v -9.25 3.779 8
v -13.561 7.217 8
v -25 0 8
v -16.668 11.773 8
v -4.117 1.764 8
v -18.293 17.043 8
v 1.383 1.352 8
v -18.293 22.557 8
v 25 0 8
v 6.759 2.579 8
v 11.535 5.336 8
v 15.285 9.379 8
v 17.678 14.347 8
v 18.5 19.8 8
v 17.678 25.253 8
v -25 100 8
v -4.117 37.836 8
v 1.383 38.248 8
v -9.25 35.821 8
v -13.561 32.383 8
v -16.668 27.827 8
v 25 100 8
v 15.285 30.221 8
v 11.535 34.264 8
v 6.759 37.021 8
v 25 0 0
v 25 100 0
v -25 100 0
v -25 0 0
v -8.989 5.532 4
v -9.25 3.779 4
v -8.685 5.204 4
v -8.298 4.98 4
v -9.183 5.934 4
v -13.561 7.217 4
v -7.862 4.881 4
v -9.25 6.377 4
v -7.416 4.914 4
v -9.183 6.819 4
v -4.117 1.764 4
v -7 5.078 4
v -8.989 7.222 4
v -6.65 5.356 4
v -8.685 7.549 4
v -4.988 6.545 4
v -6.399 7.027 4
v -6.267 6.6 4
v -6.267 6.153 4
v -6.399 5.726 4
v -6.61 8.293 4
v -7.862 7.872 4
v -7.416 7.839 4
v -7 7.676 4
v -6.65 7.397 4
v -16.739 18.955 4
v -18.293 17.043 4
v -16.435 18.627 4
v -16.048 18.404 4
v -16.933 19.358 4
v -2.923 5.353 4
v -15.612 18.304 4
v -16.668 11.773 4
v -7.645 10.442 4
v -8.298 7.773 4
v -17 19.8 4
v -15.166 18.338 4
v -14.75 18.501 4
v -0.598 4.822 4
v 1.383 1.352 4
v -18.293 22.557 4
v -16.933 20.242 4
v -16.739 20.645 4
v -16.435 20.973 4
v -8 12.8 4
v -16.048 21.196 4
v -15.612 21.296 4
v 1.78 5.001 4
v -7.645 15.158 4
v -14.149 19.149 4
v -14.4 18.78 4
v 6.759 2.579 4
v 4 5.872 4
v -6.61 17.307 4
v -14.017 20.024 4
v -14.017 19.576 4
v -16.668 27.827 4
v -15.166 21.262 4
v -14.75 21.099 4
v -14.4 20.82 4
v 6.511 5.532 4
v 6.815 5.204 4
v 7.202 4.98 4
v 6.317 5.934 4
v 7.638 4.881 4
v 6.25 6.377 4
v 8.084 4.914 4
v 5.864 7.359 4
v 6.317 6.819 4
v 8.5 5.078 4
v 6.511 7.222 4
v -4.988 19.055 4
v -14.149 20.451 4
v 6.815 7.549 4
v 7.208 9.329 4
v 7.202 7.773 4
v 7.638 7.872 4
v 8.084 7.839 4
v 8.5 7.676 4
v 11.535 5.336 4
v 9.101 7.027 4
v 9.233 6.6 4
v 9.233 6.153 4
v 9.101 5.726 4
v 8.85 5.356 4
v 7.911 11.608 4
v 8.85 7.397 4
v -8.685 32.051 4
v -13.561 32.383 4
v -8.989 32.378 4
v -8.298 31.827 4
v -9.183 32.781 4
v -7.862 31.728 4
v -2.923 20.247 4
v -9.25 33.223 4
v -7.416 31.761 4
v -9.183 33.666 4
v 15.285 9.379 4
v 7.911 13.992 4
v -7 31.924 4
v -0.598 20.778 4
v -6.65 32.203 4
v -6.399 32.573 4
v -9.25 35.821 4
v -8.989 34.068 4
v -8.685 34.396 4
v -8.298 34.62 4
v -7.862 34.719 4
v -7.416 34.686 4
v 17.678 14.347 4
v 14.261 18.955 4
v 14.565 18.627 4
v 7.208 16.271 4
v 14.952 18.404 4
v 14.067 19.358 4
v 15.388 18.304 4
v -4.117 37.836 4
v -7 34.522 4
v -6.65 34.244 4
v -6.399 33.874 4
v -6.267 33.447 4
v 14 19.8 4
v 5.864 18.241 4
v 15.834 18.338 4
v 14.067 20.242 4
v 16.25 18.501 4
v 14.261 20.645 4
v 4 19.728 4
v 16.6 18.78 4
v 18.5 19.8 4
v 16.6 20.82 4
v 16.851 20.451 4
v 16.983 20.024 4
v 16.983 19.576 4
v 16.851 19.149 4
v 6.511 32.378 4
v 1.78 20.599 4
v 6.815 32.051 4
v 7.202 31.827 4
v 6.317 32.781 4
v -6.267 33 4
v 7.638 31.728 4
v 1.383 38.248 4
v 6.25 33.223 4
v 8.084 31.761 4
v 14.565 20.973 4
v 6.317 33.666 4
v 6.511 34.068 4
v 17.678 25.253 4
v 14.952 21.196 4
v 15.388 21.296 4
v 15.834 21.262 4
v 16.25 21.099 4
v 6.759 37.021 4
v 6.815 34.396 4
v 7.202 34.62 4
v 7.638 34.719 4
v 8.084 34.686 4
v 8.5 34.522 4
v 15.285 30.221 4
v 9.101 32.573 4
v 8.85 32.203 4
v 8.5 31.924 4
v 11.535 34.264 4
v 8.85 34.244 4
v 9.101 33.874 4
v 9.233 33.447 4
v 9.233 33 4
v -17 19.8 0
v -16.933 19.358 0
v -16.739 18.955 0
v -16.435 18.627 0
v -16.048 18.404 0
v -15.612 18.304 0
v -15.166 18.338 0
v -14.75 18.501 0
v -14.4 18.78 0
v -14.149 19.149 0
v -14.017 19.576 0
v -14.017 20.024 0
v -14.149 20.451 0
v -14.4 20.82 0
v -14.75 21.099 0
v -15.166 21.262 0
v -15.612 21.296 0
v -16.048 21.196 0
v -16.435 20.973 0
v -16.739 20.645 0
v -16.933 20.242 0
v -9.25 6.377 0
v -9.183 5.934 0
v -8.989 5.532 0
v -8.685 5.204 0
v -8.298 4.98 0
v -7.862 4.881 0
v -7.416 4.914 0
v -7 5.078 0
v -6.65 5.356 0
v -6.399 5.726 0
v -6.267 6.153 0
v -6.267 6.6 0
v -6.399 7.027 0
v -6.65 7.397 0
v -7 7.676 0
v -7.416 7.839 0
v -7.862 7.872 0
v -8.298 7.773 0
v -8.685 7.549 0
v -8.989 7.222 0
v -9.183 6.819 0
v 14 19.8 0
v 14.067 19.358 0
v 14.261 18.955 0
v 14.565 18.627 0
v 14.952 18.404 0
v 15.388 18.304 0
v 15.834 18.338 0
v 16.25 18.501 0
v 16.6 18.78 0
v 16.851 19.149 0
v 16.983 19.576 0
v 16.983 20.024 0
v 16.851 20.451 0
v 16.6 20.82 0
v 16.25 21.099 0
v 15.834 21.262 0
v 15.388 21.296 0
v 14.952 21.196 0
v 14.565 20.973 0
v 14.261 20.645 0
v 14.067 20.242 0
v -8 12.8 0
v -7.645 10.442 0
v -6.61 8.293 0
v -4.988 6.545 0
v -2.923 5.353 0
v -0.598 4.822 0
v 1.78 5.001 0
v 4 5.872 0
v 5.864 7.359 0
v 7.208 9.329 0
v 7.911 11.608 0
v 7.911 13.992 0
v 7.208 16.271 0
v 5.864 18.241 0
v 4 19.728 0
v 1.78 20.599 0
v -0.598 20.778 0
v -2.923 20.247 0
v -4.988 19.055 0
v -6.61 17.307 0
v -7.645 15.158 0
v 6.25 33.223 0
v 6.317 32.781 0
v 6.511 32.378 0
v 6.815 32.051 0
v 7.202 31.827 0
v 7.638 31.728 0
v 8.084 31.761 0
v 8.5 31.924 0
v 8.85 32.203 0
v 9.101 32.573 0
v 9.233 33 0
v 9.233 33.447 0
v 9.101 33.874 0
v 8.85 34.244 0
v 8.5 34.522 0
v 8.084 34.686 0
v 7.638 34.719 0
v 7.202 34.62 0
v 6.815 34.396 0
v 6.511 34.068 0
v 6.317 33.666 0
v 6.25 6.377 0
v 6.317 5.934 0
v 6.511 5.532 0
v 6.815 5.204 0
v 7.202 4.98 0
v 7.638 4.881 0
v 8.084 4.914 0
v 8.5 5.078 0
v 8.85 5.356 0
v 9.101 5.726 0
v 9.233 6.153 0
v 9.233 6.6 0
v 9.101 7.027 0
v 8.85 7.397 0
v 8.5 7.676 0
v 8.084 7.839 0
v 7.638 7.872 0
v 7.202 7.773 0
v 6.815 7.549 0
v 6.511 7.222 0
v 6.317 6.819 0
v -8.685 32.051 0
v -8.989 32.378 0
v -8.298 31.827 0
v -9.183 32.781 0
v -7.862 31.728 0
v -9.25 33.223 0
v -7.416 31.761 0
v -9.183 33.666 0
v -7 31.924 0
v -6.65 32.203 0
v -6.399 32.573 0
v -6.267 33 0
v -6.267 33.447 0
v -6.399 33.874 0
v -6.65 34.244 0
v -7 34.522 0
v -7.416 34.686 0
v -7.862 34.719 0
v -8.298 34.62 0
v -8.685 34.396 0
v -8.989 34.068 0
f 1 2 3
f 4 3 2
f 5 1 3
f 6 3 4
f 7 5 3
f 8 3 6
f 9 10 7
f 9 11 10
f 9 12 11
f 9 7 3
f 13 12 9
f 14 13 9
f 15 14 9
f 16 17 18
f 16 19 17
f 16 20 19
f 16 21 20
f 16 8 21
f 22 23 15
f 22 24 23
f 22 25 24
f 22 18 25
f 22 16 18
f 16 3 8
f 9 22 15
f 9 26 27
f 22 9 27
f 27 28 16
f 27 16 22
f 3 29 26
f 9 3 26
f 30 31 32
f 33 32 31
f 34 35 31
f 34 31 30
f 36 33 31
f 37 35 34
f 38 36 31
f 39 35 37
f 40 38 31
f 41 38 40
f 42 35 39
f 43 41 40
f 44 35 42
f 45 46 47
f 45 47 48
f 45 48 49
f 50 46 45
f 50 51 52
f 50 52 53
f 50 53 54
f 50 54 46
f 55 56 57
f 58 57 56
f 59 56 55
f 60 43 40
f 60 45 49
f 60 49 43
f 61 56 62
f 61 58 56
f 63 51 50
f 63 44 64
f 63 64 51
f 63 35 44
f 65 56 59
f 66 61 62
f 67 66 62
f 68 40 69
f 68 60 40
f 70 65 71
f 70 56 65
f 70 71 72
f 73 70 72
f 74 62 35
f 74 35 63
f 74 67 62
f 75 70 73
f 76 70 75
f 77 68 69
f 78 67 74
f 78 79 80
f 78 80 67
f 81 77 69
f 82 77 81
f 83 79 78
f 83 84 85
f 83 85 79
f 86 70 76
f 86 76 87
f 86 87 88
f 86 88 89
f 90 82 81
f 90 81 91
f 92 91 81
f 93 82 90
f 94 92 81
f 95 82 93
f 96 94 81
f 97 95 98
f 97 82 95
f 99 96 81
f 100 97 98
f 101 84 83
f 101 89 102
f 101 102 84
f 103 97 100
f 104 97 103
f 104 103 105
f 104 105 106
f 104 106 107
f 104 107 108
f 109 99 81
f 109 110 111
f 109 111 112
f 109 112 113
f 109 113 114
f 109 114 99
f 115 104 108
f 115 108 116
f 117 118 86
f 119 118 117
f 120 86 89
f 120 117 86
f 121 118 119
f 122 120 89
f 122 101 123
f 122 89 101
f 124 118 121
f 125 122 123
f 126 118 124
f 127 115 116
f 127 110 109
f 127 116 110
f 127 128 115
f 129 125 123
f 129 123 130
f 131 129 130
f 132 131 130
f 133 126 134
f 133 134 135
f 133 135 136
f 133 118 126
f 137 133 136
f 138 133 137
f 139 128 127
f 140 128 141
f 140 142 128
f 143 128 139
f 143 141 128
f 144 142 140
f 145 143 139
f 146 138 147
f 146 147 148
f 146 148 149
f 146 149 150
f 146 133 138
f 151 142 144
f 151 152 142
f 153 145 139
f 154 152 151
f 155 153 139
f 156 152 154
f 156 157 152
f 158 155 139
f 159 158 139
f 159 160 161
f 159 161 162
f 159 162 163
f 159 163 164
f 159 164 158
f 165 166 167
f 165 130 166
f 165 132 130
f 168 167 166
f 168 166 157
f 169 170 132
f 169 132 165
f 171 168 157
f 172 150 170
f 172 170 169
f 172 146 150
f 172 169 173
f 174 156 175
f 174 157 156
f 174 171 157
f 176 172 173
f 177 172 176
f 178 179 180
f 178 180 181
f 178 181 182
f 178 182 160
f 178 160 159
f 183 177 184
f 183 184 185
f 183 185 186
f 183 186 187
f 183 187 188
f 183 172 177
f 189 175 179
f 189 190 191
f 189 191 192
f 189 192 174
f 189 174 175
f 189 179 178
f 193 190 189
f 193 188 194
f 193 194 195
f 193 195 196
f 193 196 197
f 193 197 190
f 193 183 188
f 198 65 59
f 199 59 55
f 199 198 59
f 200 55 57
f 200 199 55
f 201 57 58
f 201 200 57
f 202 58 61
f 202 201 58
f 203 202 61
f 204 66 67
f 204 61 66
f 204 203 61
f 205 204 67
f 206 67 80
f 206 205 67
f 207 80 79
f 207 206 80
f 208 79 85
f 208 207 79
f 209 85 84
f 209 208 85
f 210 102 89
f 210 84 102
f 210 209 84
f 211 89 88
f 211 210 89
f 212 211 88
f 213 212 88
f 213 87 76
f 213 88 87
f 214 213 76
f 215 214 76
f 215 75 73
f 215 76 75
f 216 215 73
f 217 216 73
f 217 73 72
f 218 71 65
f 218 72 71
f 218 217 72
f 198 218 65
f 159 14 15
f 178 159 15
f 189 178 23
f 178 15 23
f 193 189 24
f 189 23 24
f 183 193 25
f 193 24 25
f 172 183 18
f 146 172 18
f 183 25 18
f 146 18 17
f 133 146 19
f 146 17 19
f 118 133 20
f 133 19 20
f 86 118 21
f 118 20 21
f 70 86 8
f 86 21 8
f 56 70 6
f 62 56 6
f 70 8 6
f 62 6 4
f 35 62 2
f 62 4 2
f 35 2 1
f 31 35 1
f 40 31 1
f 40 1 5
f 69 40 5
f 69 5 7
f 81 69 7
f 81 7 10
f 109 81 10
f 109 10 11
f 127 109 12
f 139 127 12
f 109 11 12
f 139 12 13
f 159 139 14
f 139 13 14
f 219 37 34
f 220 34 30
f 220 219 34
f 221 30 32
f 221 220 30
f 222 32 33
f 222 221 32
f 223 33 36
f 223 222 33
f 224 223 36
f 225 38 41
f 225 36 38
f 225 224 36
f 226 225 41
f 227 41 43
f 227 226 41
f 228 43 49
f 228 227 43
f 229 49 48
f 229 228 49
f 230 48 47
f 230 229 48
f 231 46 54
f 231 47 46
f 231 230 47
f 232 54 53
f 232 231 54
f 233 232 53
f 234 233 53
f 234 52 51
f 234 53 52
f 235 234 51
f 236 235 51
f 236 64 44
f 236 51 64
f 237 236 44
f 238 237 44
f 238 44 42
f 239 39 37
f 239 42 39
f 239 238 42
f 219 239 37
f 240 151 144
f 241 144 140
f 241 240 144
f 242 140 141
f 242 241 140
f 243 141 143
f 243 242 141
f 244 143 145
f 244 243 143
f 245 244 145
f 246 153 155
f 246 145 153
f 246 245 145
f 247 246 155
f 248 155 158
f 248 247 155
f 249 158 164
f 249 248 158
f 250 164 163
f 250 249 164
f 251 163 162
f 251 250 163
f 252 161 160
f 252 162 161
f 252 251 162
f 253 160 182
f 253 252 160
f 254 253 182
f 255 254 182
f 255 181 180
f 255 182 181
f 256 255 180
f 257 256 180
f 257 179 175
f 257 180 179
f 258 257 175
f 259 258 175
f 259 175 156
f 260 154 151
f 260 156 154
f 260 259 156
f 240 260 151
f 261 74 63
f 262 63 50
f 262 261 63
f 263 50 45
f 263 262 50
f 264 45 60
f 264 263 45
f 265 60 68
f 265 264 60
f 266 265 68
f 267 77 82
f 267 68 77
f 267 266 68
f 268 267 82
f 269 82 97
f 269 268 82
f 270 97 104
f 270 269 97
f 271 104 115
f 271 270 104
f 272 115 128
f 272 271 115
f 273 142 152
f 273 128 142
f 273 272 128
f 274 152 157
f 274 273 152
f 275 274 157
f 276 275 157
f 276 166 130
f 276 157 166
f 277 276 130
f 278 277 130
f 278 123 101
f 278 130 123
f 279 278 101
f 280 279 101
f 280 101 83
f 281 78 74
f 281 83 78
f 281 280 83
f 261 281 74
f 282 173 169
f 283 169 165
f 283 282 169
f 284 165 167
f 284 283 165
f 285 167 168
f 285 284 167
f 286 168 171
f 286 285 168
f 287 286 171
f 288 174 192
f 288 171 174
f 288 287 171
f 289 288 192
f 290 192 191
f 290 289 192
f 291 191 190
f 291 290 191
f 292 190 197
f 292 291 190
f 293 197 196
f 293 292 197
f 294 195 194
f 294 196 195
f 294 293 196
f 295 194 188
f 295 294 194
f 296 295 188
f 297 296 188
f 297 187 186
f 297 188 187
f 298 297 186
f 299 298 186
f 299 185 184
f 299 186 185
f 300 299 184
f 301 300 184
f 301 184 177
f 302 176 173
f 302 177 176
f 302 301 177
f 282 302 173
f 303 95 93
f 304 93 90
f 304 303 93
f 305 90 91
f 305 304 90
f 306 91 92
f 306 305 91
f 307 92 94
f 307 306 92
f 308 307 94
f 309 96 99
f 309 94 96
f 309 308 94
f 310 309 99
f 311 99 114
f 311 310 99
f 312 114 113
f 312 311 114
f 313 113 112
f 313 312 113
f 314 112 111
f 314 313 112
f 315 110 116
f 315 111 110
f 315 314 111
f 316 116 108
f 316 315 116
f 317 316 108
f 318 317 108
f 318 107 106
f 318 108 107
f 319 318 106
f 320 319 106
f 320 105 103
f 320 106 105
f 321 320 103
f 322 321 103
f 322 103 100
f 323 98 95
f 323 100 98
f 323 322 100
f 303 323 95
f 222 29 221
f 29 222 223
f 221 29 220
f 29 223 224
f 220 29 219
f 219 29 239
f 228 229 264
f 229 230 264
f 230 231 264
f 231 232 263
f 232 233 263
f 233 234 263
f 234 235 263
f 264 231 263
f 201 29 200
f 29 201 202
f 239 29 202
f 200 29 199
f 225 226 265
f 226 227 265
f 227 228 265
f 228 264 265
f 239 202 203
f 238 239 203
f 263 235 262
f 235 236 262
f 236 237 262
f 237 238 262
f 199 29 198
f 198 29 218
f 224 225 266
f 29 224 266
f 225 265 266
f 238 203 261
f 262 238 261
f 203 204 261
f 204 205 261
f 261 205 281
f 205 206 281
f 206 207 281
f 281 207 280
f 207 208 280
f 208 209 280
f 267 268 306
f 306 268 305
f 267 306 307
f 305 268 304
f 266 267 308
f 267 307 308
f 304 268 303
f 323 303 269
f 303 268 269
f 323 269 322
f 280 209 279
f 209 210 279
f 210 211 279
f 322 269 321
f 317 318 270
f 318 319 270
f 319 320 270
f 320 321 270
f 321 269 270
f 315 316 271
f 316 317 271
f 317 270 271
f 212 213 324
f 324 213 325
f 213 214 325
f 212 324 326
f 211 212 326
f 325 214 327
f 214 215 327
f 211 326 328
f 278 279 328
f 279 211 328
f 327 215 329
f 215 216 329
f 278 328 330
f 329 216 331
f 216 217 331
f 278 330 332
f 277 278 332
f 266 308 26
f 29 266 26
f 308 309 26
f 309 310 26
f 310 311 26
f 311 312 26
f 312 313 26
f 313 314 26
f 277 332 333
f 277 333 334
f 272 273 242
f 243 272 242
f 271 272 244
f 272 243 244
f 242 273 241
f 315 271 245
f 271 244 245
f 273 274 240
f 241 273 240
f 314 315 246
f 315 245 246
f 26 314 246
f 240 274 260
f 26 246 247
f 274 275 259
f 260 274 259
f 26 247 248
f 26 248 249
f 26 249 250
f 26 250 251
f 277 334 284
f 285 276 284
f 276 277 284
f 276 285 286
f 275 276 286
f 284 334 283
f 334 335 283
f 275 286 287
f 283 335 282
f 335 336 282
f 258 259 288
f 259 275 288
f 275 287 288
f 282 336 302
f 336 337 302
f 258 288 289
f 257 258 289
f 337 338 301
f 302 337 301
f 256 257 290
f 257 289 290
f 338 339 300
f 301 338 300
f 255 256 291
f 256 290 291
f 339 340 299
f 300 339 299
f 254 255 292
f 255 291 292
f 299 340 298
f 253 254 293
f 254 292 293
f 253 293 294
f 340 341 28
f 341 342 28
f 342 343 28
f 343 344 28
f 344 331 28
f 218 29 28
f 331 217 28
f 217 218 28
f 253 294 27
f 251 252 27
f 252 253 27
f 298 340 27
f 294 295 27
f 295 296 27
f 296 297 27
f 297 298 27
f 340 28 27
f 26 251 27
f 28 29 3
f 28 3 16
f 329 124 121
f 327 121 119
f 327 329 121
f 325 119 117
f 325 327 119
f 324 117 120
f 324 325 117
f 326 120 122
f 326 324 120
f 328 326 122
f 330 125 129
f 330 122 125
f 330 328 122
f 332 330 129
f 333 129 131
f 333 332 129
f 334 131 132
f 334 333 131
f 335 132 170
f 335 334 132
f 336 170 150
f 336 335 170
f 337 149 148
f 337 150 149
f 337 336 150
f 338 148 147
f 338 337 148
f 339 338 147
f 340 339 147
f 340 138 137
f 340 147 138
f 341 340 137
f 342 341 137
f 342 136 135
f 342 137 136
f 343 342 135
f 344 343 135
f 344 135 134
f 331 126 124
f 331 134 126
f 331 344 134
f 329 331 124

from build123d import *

# Parameters (mm, degrees)
SKETCH3_W           = 50
SKETCH3_H           = 100
BOSS_EXTRUDE1_DEPTH = 8
SKETCH3_3_R         = 8
SKETCH3_3_R_2       = 1.5
CUT_EXTRUDE2_DEPTH  = 10
SKETCH4_R           = 18.5
CUT_EXTRUDE3_DEPTH  = 4


with BuildPart() as part:
    # Sketch3 → Boss-Extrude1 (new body)
    with BuildSketch(Plane.XY):
        with Locations((0, 50)):
            Rectangle(SKETCH3_W, SKETCH3_H)
    extrude(amount=BOSS_EXTRUDE1_DEPTH)

    # Sketch3<3> → Cut-Extrude2 (cut)
    with BuildSketch(Plane.XY):
        with Locations((0, 12.8)):
            Circle(SKETCH3_3_R)
        with Locations((-7.75, 33.223393759)):
            Circle(SKETCH3_3_R_2)
        with Locations((7.75, 33.223393759)):
            Circle(SKETCH3_3_R_2)
        with Locations((-15.5, 19.8)):
            Circle(SKETCH3_3_R_2)
        with Locations((-7.75, 6.376606241)):
            Circle(SKETCH3_3_R_2)
        with Locations((7.75, 6.376606241)):
            Circle(SKETCH3_3_R_2)
        with Locations((15.5, 19.8)):
            Circle(SKETCH3_3_R_2)
    extrude(amount=CUT_EXTRUDE2_DEPTH, mode=Mode.SUBTRACT)

    # Sketch4 → Cut-Extrude3 (cut)
    with BuildSketch(Plane.XY.offset(8)):
        with Locations((0, 19.8)):
            Circle(SKETCH4_R)
    extrude(amount=-CUT_EXTRUDE3_DEPTH, mode=Mode.SUBTRACT)


solid = part.part
